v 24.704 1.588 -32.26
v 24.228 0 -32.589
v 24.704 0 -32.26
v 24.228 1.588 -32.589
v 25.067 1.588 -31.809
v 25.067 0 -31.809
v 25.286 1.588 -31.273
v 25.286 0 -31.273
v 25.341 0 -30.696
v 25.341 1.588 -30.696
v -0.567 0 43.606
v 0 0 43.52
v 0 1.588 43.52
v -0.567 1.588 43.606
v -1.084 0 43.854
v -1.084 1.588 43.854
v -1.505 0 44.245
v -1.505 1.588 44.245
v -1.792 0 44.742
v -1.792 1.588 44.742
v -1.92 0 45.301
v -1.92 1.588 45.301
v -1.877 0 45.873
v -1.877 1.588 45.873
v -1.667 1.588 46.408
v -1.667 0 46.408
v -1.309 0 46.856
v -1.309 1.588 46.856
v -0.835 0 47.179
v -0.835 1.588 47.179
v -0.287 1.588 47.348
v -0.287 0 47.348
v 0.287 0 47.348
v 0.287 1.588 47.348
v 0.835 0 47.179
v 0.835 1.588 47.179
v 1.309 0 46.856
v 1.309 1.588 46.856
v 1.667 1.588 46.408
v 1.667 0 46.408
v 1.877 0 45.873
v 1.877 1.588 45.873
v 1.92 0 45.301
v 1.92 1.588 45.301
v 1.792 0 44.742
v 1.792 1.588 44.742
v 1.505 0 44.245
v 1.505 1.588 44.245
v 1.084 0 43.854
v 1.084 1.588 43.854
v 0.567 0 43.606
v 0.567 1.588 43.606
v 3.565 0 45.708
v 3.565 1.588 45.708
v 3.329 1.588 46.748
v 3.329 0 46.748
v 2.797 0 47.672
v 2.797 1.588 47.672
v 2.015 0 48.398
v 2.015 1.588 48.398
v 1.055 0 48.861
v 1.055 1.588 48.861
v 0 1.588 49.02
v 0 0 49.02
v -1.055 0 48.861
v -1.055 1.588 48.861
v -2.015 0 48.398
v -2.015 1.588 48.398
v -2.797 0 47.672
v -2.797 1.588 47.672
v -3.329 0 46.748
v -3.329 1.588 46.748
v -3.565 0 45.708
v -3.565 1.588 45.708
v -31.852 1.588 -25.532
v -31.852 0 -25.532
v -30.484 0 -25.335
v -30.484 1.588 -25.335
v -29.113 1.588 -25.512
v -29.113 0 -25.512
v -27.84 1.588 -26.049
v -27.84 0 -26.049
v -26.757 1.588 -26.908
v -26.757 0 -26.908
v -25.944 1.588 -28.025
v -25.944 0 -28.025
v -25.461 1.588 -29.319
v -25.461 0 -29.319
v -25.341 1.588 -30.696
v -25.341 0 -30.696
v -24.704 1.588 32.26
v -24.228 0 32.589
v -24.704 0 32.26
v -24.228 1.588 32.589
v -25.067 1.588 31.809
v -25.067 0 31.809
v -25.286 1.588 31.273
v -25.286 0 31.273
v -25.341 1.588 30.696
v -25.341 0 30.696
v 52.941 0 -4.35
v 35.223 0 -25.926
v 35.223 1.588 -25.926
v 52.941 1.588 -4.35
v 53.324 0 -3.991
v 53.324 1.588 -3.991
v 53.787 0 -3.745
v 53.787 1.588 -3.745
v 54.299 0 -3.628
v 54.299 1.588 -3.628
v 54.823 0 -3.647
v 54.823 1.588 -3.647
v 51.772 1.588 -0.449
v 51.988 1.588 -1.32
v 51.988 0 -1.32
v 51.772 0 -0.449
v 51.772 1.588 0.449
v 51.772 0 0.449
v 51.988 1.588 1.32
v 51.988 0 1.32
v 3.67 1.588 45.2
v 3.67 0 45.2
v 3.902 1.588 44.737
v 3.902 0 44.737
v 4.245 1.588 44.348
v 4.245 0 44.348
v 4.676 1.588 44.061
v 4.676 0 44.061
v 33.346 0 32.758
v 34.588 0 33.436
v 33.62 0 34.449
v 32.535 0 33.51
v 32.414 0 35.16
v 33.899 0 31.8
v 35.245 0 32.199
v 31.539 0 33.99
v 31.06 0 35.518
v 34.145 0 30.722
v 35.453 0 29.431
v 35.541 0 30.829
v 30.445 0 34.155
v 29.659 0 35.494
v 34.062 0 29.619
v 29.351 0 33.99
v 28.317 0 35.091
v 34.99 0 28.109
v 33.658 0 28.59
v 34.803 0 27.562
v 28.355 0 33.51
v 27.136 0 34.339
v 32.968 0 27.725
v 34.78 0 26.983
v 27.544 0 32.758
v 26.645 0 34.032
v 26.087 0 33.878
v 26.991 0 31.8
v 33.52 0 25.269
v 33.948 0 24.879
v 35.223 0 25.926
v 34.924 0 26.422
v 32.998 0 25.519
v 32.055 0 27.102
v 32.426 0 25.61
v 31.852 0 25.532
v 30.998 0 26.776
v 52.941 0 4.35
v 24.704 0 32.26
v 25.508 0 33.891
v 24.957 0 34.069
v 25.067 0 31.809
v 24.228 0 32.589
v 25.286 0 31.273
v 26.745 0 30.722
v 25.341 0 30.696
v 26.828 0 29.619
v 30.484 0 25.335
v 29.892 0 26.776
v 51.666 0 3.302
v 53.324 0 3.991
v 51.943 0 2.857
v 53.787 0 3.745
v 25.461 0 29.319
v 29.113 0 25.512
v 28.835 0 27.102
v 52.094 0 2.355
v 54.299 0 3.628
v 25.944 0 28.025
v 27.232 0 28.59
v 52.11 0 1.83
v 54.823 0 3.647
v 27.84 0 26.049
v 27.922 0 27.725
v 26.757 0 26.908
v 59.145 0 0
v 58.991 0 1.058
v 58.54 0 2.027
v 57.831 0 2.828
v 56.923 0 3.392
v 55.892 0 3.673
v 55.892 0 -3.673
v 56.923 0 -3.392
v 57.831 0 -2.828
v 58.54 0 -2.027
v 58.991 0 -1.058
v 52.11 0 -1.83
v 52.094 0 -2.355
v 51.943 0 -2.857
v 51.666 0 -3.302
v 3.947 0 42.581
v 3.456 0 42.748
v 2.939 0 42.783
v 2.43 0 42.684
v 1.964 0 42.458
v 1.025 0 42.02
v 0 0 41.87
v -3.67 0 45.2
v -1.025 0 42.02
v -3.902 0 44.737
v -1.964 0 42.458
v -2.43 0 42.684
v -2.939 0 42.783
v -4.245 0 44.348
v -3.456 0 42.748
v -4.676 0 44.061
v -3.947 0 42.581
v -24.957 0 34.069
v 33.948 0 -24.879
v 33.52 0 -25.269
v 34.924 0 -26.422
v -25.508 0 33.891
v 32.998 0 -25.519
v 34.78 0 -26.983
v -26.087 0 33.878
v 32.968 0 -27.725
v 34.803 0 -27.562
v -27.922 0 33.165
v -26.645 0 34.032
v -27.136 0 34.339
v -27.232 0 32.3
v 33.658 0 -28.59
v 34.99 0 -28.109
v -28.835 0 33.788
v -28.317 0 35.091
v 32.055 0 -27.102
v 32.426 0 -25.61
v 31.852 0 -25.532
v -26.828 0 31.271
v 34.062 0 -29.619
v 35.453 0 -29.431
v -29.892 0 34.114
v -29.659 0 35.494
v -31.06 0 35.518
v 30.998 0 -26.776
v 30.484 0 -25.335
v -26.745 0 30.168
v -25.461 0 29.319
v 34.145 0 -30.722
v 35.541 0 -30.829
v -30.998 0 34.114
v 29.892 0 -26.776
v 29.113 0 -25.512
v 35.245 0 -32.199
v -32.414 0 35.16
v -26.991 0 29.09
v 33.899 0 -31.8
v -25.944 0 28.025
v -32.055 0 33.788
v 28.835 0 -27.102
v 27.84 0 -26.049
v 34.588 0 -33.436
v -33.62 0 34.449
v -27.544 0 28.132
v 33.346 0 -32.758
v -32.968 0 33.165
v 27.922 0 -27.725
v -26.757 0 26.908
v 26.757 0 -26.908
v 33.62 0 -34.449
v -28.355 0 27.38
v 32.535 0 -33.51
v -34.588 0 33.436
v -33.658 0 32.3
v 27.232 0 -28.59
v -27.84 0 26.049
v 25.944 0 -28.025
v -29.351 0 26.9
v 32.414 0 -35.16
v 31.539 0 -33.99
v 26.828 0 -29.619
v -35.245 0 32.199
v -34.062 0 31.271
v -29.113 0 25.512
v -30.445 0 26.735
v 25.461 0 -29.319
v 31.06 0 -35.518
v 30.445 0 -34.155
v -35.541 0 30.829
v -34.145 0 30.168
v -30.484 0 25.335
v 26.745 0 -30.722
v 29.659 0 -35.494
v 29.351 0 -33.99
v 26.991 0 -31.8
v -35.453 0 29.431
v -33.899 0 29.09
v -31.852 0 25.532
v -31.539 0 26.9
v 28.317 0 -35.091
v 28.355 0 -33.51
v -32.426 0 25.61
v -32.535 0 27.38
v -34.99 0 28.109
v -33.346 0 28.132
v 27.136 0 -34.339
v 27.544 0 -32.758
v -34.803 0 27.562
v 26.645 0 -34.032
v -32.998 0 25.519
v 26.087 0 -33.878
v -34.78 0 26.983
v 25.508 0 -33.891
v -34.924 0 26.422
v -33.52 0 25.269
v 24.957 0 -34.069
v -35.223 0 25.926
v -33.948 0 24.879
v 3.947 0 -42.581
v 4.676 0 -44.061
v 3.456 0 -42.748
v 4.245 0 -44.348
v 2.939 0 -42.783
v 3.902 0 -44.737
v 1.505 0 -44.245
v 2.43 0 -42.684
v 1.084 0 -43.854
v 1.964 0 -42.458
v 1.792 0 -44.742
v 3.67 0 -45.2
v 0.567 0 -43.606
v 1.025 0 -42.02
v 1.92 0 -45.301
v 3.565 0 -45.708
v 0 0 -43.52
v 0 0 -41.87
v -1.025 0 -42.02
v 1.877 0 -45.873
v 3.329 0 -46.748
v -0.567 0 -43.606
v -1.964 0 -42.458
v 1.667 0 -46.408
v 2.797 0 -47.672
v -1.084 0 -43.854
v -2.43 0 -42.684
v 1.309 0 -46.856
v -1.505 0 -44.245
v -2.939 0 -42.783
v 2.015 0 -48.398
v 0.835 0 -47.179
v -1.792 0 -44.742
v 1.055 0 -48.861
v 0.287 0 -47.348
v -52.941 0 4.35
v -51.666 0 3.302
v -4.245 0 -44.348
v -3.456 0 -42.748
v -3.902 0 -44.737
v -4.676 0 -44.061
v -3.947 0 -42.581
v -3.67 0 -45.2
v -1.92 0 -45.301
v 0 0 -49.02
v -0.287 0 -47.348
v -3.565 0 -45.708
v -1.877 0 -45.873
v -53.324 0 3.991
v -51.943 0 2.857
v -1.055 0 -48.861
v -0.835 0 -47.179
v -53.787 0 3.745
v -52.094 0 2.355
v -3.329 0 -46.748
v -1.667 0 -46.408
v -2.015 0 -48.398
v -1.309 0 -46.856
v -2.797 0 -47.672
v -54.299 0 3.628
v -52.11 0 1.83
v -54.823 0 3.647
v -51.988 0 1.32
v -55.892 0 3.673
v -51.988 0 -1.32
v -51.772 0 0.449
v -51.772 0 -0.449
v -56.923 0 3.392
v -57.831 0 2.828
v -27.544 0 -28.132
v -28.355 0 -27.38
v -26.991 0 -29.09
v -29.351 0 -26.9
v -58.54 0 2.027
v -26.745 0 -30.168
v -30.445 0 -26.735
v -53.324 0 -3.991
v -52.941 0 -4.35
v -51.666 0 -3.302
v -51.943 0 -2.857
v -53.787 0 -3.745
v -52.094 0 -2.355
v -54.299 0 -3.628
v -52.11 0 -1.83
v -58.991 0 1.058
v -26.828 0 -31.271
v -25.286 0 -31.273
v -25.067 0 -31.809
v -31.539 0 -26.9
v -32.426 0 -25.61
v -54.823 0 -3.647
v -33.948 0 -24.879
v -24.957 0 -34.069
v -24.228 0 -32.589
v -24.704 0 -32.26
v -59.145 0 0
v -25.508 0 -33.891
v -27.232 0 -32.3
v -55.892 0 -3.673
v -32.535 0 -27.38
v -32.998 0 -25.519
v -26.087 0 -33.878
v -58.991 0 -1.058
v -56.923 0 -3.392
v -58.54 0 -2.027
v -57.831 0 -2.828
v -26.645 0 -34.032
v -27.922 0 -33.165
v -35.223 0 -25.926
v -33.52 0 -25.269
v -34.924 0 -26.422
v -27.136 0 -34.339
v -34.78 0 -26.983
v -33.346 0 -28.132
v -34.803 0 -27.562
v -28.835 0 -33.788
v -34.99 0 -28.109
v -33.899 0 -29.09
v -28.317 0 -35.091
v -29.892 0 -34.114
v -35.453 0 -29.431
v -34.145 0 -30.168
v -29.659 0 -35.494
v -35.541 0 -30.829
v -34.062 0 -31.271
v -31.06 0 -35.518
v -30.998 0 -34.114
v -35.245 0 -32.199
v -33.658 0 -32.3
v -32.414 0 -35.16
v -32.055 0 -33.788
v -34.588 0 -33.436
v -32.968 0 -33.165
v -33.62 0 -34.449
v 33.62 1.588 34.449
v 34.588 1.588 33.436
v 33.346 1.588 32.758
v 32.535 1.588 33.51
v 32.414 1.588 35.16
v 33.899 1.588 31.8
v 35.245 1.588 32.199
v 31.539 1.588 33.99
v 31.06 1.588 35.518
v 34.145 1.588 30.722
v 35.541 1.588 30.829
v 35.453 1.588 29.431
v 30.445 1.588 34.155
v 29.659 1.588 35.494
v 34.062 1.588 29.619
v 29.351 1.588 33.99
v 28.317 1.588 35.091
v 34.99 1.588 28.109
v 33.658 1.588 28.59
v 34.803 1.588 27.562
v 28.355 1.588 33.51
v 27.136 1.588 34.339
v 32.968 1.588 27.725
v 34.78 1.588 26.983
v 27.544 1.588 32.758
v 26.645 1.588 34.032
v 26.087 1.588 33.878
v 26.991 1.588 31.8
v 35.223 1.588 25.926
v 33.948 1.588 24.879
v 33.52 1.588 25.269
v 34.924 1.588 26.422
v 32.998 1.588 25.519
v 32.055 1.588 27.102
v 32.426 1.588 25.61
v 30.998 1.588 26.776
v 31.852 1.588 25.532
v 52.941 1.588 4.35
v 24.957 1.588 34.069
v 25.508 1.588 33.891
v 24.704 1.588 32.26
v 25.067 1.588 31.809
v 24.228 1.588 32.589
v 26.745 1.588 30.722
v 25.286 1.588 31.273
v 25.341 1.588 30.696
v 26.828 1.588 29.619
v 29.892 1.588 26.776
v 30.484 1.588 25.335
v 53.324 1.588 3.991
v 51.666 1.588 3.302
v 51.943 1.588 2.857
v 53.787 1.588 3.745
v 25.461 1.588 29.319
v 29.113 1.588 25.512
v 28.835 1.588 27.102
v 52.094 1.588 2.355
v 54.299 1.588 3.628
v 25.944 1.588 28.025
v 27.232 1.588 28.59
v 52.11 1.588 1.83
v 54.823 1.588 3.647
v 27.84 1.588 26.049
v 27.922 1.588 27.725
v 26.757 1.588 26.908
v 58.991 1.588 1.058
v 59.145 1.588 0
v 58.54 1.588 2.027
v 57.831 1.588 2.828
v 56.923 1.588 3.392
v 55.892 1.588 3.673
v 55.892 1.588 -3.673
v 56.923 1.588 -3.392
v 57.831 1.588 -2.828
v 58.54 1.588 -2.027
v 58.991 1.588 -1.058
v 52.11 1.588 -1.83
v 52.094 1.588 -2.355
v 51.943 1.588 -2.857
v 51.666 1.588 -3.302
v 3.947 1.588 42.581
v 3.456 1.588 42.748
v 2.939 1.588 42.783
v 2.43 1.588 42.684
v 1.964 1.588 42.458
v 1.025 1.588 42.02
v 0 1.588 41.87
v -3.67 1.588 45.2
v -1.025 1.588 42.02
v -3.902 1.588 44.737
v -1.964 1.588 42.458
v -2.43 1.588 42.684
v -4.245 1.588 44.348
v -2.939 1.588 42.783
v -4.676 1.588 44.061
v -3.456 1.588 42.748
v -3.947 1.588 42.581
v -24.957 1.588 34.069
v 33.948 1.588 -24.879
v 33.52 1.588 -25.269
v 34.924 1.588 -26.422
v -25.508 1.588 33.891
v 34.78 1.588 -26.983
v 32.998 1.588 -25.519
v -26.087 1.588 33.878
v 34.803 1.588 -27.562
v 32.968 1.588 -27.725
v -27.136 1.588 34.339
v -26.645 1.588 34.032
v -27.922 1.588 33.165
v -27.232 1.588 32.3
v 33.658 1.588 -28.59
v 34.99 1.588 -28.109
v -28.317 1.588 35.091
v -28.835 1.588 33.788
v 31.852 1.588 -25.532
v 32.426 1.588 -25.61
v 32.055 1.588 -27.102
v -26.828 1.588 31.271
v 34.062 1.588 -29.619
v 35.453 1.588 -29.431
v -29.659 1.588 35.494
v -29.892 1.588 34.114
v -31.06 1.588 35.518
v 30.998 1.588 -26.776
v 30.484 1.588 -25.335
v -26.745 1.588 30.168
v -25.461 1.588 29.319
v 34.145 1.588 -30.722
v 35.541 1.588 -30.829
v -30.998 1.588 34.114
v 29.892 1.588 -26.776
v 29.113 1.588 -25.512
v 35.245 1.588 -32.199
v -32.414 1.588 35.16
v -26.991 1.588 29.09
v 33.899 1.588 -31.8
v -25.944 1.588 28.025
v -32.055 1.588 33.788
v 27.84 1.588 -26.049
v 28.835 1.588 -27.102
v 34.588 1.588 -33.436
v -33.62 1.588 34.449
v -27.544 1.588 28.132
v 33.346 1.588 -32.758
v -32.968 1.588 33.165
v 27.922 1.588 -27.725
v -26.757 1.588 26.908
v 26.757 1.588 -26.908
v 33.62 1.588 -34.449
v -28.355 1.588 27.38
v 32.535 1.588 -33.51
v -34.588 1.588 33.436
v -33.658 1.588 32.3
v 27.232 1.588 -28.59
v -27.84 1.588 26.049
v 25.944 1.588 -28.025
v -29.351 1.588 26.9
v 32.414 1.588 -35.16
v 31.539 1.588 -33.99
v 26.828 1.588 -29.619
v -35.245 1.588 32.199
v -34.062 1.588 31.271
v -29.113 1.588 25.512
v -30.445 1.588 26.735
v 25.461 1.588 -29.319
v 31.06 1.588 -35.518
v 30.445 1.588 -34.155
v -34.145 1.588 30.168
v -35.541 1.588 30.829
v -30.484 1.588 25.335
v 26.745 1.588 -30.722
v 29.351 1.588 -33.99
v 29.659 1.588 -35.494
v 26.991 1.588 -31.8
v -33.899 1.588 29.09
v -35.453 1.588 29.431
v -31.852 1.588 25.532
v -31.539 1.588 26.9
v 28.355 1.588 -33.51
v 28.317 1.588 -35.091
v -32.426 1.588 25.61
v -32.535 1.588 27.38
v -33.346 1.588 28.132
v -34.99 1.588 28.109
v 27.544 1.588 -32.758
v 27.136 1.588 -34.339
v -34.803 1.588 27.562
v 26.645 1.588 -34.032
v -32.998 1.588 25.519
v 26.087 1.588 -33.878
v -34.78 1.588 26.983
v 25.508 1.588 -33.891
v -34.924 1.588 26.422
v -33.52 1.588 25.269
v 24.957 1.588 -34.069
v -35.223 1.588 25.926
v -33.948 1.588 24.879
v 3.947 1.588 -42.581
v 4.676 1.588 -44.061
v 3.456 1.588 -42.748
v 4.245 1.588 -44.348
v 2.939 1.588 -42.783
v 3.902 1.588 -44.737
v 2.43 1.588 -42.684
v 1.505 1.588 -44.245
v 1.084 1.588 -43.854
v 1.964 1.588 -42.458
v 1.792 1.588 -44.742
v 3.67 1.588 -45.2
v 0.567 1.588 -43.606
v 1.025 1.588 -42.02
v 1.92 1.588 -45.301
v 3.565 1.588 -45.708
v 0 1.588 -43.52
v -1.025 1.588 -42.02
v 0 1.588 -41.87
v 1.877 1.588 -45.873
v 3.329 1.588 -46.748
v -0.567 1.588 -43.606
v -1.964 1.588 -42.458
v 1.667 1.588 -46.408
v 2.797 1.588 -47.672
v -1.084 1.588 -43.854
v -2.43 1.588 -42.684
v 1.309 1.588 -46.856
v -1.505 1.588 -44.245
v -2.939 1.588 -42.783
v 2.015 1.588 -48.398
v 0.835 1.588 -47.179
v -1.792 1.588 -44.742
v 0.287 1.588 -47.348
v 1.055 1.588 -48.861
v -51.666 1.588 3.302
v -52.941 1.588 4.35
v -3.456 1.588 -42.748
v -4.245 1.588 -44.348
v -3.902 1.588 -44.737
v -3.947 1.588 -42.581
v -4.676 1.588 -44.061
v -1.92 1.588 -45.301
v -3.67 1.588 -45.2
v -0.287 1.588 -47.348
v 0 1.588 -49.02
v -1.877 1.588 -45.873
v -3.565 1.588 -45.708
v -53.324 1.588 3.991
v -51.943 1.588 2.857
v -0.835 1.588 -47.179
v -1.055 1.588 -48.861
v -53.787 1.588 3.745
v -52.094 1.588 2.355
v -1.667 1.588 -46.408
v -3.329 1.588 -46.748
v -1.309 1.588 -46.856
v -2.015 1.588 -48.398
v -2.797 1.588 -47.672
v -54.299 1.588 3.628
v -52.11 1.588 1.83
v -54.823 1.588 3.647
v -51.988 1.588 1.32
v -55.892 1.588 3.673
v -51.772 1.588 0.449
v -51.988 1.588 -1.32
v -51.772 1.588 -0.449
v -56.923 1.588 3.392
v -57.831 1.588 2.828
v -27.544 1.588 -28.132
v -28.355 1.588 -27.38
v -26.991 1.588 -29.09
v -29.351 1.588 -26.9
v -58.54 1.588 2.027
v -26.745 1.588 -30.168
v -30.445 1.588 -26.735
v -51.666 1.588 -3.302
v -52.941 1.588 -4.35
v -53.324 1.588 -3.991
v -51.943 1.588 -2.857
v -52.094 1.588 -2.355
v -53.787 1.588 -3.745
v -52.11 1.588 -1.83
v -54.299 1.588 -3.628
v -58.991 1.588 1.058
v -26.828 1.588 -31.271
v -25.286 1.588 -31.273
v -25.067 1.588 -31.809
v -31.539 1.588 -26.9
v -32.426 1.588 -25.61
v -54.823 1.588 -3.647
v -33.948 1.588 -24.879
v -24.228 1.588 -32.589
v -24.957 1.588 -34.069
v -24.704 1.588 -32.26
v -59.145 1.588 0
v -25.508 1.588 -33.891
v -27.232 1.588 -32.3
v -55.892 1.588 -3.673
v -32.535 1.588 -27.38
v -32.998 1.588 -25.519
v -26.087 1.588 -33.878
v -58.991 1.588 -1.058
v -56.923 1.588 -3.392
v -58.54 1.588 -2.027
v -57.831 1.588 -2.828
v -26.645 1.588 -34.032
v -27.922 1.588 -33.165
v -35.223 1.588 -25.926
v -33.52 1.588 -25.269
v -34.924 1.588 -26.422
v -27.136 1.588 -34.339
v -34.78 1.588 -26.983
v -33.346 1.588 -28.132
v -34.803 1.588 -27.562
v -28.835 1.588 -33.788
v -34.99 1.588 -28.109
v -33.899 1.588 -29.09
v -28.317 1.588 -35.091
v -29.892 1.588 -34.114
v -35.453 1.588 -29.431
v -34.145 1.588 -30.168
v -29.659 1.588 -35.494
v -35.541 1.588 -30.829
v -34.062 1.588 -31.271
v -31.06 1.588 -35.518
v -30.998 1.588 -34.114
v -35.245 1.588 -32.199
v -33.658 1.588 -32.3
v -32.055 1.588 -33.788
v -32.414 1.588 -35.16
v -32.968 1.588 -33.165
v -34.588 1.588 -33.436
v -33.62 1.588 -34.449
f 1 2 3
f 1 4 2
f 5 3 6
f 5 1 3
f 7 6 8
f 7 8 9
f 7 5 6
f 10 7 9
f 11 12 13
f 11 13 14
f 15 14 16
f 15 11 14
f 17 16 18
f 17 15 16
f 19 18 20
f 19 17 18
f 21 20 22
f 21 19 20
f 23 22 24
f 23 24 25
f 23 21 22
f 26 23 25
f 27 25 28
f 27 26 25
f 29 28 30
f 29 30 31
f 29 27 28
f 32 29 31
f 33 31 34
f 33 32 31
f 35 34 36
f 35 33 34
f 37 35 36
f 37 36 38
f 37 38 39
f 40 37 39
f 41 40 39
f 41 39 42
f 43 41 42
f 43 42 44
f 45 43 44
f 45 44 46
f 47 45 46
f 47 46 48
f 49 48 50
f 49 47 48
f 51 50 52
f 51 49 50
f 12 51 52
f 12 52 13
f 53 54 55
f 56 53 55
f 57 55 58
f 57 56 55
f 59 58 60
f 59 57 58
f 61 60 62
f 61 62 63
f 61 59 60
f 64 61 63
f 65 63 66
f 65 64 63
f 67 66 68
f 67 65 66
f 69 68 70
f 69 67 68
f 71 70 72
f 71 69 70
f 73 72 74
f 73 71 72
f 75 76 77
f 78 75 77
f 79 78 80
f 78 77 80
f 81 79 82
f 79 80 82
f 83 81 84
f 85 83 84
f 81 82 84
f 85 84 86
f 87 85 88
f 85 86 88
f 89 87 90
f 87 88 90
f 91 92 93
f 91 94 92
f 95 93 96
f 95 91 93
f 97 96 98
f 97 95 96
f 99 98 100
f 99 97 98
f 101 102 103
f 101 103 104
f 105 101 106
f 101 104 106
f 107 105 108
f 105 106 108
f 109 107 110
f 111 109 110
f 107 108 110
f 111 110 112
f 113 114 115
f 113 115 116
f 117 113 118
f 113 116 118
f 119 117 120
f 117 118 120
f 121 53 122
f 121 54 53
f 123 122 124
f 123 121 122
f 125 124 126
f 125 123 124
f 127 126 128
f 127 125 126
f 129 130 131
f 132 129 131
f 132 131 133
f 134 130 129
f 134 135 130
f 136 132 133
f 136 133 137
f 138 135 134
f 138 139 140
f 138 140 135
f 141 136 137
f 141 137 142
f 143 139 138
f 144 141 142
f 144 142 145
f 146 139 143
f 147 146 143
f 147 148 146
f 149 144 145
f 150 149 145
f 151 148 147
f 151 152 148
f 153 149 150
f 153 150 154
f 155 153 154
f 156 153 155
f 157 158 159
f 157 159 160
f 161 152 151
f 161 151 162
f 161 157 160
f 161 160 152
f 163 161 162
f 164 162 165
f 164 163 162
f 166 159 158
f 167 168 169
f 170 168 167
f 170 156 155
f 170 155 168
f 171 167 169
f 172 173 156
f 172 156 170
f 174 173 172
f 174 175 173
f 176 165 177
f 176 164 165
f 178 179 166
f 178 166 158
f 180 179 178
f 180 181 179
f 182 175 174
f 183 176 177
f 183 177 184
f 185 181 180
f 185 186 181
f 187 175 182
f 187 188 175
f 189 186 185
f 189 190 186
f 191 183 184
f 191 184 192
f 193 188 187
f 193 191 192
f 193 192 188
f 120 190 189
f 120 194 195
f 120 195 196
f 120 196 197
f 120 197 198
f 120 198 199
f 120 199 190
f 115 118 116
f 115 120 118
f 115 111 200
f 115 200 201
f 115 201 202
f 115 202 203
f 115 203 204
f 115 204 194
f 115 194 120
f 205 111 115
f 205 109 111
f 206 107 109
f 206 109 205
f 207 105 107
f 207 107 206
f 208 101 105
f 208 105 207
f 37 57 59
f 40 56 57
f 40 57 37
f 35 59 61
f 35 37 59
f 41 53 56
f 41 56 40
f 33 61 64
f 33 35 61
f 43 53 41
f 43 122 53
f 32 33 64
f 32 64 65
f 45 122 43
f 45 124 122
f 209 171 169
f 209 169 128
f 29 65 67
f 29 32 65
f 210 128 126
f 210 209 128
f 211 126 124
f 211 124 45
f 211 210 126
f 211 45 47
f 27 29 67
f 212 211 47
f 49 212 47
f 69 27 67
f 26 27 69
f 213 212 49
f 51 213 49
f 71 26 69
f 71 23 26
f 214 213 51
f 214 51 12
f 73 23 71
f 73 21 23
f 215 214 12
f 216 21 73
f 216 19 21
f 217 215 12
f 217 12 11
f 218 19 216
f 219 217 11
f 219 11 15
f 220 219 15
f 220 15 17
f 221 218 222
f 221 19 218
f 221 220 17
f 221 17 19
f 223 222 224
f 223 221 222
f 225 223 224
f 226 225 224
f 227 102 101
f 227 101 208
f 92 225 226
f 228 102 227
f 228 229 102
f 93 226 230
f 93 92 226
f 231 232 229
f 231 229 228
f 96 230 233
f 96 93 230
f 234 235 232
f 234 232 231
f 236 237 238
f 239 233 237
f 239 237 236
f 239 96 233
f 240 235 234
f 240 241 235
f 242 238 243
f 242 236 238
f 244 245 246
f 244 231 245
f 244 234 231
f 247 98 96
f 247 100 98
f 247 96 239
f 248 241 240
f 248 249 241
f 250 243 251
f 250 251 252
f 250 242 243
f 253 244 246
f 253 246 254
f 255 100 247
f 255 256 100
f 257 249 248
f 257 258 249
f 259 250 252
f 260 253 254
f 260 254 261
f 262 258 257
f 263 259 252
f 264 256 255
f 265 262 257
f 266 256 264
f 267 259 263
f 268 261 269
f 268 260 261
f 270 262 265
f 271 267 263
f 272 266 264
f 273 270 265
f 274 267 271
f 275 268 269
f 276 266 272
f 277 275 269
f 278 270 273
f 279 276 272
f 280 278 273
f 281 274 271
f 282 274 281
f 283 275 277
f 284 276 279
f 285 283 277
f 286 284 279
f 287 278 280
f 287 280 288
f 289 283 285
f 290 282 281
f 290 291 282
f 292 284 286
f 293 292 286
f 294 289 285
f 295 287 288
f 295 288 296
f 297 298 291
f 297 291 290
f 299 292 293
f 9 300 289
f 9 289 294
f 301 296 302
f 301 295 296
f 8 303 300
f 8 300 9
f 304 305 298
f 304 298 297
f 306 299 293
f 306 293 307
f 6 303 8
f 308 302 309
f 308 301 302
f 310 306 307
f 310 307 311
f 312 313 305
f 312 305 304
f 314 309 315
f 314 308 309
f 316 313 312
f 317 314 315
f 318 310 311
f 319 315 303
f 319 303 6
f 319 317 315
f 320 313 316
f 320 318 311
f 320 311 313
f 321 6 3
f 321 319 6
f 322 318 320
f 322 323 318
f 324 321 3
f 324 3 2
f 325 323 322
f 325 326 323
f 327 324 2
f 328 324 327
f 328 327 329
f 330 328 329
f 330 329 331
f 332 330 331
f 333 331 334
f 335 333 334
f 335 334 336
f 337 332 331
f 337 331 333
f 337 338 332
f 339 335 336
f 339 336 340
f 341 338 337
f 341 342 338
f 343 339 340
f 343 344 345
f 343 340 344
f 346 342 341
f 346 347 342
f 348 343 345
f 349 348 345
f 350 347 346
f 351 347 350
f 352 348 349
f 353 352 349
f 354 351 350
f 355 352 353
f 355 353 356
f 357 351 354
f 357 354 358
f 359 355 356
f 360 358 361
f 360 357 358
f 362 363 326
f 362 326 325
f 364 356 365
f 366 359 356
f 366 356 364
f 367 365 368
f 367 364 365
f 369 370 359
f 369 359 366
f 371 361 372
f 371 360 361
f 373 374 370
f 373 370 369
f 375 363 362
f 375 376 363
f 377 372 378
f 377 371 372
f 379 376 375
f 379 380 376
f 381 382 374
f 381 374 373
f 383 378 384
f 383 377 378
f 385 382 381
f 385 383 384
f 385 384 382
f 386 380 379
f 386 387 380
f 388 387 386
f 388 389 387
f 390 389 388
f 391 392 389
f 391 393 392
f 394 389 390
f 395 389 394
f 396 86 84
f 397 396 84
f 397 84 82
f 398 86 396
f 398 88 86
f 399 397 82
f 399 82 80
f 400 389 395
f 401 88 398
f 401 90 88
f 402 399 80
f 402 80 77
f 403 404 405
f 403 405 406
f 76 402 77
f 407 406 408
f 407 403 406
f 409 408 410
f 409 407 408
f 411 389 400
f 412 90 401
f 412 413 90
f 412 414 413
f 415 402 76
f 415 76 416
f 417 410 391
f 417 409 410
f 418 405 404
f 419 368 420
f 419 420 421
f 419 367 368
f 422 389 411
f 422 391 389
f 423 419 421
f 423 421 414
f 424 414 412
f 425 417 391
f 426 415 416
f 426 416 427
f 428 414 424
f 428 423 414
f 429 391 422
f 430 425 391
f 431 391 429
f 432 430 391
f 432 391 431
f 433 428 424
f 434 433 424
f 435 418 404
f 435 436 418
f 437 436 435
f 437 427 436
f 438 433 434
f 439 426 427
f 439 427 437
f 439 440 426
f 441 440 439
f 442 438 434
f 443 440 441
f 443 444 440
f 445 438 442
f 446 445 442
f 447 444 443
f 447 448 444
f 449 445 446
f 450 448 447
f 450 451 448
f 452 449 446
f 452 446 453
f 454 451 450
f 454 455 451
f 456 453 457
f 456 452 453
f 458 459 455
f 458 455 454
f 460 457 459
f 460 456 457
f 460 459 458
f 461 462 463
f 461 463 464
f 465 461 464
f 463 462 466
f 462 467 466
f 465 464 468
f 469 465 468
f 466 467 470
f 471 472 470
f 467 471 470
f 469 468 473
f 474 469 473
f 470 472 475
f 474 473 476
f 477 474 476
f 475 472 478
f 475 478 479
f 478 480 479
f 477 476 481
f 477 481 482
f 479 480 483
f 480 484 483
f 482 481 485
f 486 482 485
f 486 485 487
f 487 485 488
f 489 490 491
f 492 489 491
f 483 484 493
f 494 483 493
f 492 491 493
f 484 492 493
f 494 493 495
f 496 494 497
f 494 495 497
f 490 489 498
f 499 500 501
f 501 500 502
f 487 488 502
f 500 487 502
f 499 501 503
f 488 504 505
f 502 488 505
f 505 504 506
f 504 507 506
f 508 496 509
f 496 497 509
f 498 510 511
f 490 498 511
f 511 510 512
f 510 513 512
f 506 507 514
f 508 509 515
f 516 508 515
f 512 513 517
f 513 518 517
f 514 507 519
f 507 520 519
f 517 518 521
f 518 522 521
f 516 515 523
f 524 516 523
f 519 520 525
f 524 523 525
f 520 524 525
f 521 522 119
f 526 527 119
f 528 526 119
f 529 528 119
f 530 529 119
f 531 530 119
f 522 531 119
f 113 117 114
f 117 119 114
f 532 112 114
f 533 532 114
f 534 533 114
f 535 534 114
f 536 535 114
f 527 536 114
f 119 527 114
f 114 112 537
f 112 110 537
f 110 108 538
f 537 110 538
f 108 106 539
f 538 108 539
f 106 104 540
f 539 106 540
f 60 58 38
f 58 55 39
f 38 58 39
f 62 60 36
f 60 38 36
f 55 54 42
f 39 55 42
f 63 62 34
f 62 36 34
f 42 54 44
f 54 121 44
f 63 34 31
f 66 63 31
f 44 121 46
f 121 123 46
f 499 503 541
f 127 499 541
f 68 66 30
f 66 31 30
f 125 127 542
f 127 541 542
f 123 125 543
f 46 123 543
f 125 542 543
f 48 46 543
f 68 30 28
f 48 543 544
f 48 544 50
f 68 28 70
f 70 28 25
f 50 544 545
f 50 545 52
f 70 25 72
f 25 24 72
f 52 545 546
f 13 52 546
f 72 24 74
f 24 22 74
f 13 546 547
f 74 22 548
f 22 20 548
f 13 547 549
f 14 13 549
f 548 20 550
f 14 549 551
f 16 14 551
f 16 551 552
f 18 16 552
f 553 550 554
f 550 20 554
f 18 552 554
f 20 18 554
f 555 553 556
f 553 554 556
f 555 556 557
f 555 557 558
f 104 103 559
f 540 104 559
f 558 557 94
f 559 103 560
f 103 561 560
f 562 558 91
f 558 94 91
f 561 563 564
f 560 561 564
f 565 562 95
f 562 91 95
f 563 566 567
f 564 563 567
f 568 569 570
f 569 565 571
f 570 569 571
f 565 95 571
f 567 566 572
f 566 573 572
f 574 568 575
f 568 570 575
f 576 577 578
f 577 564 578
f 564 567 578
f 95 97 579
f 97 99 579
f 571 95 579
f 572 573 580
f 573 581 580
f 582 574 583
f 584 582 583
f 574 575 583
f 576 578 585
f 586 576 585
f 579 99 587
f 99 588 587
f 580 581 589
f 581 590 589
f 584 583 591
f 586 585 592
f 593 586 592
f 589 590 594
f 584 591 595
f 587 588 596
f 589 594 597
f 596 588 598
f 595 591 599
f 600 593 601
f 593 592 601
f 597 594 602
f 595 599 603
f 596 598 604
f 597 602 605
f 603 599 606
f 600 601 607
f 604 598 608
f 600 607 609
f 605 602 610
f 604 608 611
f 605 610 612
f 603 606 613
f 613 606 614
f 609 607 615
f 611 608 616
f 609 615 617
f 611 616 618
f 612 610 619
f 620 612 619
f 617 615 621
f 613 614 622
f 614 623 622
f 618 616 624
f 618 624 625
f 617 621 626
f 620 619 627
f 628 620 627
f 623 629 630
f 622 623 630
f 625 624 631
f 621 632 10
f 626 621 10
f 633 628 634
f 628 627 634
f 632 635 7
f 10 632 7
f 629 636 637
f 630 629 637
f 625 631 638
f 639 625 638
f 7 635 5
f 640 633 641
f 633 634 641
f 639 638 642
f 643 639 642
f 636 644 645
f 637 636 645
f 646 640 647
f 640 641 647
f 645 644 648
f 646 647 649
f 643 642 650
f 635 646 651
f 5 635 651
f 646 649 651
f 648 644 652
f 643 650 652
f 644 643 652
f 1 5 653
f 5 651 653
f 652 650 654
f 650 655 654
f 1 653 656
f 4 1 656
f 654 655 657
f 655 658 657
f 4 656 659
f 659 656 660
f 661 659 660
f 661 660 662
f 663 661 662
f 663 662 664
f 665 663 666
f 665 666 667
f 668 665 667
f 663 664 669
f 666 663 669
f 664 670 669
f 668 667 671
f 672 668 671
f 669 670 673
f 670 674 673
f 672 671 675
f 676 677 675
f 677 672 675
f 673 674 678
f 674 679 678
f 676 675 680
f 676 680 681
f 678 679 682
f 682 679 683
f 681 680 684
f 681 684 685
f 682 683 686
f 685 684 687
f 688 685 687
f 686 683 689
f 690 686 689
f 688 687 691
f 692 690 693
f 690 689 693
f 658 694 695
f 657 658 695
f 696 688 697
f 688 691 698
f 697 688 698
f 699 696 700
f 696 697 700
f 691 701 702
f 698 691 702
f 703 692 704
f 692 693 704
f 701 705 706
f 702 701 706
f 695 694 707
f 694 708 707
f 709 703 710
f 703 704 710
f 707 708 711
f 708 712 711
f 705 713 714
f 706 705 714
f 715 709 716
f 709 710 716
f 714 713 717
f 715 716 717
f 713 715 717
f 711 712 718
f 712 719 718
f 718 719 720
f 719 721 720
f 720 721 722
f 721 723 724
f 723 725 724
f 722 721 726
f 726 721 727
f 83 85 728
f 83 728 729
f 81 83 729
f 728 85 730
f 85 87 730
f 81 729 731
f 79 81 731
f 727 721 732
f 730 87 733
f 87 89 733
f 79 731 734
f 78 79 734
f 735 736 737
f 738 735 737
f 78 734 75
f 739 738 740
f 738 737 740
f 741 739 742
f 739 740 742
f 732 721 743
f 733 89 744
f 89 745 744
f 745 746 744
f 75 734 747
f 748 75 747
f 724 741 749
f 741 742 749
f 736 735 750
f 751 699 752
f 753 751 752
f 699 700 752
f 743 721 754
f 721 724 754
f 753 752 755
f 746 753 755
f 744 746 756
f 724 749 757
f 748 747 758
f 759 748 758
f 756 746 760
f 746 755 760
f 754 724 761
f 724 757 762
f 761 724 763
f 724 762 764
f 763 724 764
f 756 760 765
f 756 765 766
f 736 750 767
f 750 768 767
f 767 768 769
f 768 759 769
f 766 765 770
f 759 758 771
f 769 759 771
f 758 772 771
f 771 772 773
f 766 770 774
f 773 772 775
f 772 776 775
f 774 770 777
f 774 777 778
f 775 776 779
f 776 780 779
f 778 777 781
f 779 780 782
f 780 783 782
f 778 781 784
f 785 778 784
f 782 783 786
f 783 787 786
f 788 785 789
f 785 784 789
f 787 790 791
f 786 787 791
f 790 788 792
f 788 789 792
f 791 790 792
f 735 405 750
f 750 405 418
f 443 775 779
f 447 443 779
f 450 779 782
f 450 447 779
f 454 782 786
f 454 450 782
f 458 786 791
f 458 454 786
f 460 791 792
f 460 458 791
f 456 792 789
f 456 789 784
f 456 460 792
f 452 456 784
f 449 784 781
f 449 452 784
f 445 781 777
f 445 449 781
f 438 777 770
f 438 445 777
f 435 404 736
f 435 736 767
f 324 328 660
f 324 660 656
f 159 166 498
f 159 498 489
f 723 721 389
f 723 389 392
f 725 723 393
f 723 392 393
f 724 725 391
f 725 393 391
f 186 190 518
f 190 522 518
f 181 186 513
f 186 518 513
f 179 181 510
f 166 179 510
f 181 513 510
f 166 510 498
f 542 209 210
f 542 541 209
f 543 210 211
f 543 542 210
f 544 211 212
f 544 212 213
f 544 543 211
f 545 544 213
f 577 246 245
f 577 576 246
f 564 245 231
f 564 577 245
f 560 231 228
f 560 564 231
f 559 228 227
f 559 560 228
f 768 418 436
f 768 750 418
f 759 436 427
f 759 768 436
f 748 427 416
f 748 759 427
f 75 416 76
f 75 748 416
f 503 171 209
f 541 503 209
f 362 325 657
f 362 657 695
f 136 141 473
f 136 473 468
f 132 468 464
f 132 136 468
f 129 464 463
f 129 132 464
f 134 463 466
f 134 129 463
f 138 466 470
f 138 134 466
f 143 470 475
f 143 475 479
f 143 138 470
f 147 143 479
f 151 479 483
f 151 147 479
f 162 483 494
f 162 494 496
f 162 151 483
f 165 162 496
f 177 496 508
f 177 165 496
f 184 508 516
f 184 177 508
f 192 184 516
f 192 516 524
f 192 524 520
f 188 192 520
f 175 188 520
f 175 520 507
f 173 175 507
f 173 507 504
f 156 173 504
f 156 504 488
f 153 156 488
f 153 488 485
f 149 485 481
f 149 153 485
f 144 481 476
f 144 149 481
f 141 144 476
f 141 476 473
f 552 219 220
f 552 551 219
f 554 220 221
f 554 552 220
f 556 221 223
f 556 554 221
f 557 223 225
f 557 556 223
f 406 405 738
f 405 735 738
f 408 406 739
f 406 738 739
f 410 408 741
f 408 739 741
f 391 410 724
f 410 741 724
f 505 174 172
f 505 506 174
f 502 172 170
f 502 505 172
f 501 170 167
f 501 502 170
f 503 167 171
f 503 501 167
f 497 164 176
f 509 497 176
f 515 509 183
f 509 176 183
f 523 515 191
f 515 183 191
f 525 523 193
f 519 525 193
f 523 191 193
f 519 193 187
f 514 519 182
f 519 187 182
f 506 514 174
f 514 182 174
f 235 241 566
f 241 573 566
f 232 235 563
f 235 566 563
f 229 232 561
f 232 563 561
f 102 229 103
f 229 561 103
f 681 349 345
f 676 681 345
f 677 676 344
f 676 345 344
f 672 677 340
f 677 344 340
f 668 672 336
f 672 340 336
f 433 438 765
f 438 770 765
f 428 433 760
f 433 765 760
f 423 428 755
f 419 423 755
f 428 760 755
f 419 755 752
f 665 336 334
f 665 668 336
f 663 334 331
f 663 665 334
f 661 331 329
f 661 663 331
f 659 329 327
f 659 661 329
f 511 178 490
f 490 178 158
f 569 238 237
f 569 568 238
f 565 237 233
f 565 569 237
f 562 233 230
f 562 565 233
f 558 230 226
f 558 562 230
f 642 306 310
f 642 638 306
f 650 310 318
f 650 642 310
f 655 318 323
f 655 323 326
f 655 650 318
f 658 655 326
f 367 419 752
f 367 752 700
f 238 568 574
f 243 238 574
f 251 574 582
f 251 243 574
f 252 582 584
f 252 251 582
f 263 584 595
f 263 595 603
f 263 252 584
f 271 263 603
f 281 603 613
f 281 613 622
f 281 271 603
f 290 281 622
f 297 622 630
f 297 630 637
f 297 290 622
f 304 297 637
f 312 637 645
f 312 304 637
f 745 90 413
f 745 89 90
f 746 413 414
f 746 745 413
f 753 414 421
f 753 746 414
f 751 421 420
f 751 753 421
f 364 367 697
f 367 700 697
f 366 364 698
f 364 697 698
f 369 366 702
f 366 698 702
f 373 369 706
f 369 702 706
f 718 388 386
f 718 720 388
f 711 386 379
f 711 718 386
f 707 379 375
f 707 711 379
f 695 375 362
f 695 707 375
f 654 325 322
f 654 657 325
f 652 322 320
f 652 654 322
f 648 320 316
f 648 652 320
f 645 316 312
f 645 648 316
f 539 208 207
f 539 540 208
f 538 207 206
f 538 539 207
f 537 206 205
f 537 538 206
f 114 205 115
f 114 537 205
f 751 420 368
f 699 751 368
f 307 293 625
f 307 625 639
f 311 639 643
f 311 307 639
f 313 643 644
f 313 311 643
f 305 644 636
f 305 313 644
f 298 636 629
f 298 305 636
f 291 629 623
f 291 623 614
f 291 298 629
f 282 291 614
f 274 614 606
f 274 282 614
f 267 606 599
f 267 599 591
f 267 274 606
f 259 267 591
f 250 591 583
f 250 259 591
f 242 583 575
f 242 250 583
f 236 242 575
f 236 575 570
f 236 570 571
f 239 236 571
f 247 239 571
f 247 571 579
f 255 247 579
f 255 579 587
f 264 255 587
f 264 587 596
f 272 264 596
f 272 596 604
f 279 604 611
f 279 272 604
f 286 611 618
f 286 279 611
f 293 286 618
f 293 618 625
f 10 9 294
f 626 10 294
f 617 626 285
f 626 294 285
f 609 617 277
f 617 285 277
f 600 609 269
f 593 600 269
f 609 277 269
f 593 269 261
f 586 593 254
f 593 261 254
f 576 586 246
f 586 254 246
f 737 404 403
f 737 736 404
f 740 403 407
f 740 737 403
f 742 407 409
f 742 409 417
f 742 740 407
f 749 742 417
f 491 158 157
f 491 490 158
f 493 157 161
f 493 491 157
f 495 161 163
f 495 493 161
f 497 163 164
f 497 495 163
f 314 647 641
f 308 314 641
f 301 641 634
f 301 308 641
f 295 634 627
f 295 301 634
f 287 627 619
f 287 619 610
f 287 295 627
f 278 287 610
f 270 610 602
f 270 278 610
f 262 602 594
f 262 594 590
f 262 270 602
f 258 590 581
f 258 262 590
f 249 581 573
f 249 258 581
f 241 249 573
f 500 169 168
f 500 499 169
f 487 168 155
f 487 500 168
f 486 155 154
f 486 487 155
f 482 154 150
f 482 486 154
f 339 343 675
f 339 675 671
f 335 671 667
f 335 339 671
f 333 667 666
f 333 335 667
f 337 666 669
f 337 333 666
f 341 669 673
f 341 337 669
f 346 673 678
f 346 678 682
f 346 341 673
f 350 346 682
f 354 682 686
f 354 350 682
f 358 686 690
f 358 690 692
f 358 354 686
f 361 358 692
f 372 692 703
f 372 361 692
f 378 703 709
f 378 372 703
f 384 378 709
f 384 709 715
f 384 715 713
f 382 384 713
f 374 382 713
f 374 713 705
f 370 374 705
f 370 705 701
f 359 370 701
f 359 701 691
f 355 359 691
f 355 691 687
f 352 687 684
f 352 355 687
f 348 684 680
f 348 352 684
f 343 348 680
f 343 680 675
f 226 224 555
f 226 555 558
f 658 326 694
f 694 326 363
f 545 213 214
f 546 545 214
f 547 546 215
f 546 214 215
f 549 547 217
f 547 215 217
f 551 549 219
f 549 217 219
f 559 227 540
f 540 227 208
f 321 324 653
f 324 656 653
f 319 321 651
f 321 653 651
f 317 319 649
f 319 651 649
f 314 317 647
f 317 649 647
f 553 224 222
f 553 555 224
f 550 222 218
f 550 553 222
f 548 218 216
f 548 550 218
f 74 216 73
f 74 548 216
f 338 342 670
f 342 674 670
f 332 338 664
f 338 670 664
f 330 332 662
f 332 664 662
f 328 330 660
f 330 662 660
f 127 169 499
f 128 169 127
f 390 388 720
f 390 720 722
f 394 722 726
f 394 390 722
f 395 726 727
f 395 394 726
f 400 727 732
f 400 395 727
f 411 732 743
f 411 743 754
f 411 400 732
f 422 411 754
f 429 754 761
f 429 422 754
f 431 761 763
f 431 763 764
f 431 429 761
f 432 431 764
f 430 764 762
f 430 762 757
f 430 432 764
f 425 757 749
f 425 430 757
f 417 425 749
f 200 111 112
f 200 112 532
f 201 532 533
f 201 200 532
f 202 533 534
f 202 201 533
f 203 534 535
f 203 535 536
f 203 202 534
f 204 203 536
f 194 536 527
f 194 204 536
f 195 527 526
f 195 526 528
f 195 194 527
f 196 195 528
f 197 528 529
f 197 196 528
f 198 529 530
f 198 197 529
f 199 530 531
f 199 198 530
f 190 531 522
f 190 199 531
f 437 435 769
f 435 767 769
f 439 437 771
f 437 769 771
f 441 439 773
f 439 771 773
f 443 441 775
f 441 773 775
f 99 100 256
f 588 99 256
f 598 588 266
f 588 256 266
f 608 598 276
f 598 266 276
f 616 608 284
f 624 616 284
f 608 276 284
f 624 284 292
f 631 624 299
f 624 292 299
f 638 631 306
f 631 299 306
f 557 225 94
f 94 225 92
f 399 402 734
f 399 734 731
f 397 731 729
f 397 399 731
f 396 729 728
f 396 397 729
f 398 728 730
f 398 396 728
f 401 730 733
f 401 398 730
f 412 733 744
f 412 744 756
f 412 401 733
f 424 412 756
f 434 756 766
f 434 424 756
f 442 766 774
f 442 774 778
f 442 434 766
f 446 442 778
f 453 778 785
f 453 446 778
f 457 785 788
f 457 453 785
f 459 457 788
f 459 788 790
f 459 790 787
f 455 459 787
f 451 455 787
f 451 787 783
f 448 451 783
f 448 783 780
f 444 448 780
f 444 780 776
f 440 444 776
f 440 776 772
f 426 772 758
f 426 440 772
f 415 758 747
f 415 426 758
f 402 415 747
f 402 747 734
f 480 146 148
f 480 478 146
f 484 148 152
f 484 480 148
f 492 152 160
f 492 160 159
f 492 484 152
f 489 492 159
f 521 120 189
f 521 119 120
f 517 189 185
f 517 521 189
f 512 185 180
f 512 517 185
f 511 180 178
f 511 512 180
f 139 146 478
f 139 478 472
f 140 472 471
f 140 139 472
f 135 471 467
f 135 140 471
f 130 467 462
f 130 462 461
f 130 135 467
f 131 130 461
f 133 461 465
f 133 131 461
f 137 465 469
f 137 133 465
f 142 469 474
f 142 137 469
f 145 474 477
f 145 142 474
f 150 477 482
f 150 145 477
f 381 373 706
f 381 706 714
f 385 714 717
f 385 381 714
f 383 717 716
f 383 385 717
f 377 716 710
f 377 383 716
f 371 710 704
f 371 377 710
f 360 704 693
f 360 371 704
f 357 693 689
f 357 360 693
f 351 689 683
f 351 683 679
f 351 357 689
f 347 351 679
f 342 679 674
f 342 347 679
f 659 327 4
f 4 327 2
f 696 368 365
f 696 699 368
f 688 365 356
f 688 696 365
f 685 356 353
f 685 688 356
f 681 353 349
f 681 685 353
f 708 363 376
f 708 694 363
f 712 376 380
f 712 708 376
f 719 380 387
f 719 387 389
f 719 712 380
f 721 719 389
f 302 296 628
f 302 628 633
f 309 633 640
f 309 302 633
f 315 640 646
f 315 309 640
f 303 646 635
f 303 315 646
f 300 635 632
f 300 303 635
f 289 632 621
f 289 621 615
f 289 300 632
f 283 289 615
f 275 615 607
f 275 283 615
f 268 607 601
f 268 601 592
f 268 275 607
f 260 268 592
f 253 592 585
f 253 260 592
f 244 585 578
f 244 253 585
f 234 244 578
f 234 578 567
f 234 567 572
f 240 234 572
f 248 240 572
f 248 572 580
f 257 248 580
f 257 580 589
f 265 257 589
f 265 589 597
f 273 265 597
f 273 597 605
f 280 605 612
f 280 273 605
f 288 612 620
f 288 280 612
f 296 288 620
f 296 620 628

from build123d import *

# Parameters (mm, degrees)
SKETCH1_R           = 3.71
SKETCH1_R_2         = 1.925
BOSS_EXTRUDE1_DEPTH = 1.5875
FILLET1_R           = 2


with BuildPart() as part:
    # Sketch1 → Boss-Extrude1 (new body)
    with BuildSketch(Plane(origin=(0, 0, 0), x_dir=(1, 0, 0), z_dir=(0, 1, 0))):
        with BuildLine():
            Line((-53.793633628, 3.311040487), (-34.282911165, 27.071198303))
            ThreePointArc((-34.282911165, 27.071198303), (-33.620388047, 34.448624702), (-26.285908277, 33.413847594))
            Line((-26.285908277, 33.413847594), (-3.48495612, 44.647688368))
            ThreePointArc((-3.48495612, 44.647688368), (0, 49.02), (3.48495612, 44.647688368))
            Line((3.48495612, 44.647688368), (26.285908277, 33.413847594))
            ThreePointArc((26.285908277, 33.413847594), (33.620388047, 34.448624702), (34.282911165, 27.071198303))
            Line((34.282911165, 27.071198303), (53.793633628, 3.311040487))
            ThreePointArc((53.793633628, 3.311040487), (59.145, 0), (53.793633628, -3.311040487))
            Line((53.793633628, -3.311040487), (34.282911165, -27.071198303))
            ThreePointArc((34.282911165, -27.071198303), (33.620388047, -34.448624702), (26.285908277, -33.413847594))
            Line((26.285908277, -33.413847594), (3.48495612, -44.647688368))
            ThreePointArc((3.48495612, -44.647688368), (0, -49.02), (-3.48495612, -44.647688368))
            Line((-3.48495612, -44.647688368), (-26.285908277, -33.413847594))
            ThreePointArc((-26.285908277, -33.413847594), (-33.620388047, -34.448624702), (-34.282911165, -27.071198303))
            Line((-34.282911165, -27.071198303), (-53.793633628, -3.311040487))
            ThreePointArc((-53.793633628, -3.311040487), (-59.145, 0), (-53.793633628, 3.311040487))
        make_face()
        with Locations(Location((-30.445, 30.445, 0), (0, 0, 270))):
            Circle(SKETCH1_R, mode=Mode.SUBTRACT)
        with Locations(Location((0, -45.445, 0), (0, 0, 90))):
            Circle(SKETCH1_R_2, mode=Mode.SUBTRACT)
        with Locations(Location((-30.445, -30.445, 0), (0, 0, 90))):
            Circle(SKETCH1_R, mode=Mode.SUBTRACT)
        with Locations(Location((0, 45.445, 0), (0, 0, 270))):
            Circle(SKETCH1_R_2, mode=Mode.SUBTRACT)
        with Locations(Location((30.445, -30.445, 0), (0, 0, 270))):
            Circle(SKETCH1_R, mode=Mode.SUBTRACT)
        with Locations(Location((30.445, 30.445, 0), (0, 0, 90))):
            Circle(SKETCH1_R, mode=Mode.SUBTRACT)
        with BuildLine():
            Line((-52.518462907, 2.263930353), (-33.007740444, 26.024088169))
            ThreePointArc((-33.007740444, 26.024088169), (-27.269611953, 26.441375298), (-25.556672132, 31.933741299))
            Line((-25.556672132, 31.933741299), (-2.755719976, 43.167582073))
            ThreePointArc((-2.755719976, 43.167582073), (0, 41.87), (2.755719976, 43.167582073))
            Line((2.755719976, 43.167582073), (25.556672132, 31.933741299))
            ThreePointArc((25.556672132, 31.933741299), (27.269611953, 26.441375298), (33.007740444, 26.024088169))
            Line((33.007740444, 26.024088169), (52.518462907, 2.263930353))
            ThreePointArc((52.518462907, 2.263930353), (51.745, 0), (52.518462907, -2.263930353))
            Line((52.518462907, -2.263930353), (33.007740444, -26.024088169))
            ThreePointArc((33.007740444, -26.024088169), (27.269611953, -26.441375298), (25.556672132, -31.933741299))
            Line((25.556672132, -31.933741299), (2.755719976, -43.167582073))
            ThreePointArc((2.755719976, -43.167582073), (0, -41.87), (-2.755719976, -43.167582073))
            Line((-2.755719976, -43.167582073), (-25.556672132, -31.933741299))
            ThreePointArc((-25.556672132, -31.933741299), (-27.269611953, -26.441375298), (-33.007740444, -26.024088169))
            Line((-33.007740444, -26.024088169), (-52.518462907, -2.263930353))
            ThreePointArc((-52.518462907, -2.263930353), (-51.745, 0), (-52.518462907, 2.263930353))
        make_face(mode=Mode.SUBTRACT)
    extrude(amount=BOSS_EXTRUDE1_DEPTH)

    # Fillet1
    fillet1_edges = [part.edges().sort_by_distance(p)[0] for p in [
        (26.285908277, 0.79375, 33.413847594),
        (3.48495612, 0.79375, 44.647688368),
        (-3.48495612, 0.79375, 44.647688368),
        (-26.285908277, 0.79375, 33.413847594),
        (-34.282911165, 0.79375, 27.071198303),
        (-53.793633628, 0.79375, 3.311040487),
        (-53.793633628, 0.79375, -3.311040487),
        (-34.282911165, 0.79375, -27.071198303),
        (-26.285908277, 0.79375, -33.413847594),
        (-3.48495612, 0.79375, -44.647688368),
        (3.48495612, 0.79375, -44.647688368),
        (26.285908277, 0.79375, -33.413847594),
        (34.282911165, 0.79375, -27.071198303),
        (53.793633628, 0.79375, -3.311040487),
        (53.793633628, 0.79375, 3.311040487),
        (34.282911165, 0.79375, 27.071198303),
        (-52.518462907, 0.79375, -2.263930353),
        (-52.518462907, 0.79375, 2.263930353),
        (-33.007740444, 0.79375, 26.024088169),
        (-25.556672132, 0.79375, 31.933741299),
        (-2.755719976, 0.79375, 43.167582073),
        (2.755719976, 0.79375, 43.167582073),
        (25.556672132, 0.79375, 31.933741299),
        (33.007740444, 0.79375, 26.024088169),
        (52.518462907, 0.79375, 2.263930353),
        (52.518462907, 0.79375, -2.263930353),
        (33.007740444, 0.79375, -26.024088169),
        (25.556672132, 0.79375, -31.933741299),
        (2.755719976, 0.79375, -43.167582073),
        (-2.755719976, 0.79375, -43.167582073),
        (-25.556672132, 0.79375, -31.933741299),
        (-33.007740444, 0.79375, -26.024088169),
    ]]
    fillet(fillet1_edges, radius=FILLET1_R)


solid = part.part
